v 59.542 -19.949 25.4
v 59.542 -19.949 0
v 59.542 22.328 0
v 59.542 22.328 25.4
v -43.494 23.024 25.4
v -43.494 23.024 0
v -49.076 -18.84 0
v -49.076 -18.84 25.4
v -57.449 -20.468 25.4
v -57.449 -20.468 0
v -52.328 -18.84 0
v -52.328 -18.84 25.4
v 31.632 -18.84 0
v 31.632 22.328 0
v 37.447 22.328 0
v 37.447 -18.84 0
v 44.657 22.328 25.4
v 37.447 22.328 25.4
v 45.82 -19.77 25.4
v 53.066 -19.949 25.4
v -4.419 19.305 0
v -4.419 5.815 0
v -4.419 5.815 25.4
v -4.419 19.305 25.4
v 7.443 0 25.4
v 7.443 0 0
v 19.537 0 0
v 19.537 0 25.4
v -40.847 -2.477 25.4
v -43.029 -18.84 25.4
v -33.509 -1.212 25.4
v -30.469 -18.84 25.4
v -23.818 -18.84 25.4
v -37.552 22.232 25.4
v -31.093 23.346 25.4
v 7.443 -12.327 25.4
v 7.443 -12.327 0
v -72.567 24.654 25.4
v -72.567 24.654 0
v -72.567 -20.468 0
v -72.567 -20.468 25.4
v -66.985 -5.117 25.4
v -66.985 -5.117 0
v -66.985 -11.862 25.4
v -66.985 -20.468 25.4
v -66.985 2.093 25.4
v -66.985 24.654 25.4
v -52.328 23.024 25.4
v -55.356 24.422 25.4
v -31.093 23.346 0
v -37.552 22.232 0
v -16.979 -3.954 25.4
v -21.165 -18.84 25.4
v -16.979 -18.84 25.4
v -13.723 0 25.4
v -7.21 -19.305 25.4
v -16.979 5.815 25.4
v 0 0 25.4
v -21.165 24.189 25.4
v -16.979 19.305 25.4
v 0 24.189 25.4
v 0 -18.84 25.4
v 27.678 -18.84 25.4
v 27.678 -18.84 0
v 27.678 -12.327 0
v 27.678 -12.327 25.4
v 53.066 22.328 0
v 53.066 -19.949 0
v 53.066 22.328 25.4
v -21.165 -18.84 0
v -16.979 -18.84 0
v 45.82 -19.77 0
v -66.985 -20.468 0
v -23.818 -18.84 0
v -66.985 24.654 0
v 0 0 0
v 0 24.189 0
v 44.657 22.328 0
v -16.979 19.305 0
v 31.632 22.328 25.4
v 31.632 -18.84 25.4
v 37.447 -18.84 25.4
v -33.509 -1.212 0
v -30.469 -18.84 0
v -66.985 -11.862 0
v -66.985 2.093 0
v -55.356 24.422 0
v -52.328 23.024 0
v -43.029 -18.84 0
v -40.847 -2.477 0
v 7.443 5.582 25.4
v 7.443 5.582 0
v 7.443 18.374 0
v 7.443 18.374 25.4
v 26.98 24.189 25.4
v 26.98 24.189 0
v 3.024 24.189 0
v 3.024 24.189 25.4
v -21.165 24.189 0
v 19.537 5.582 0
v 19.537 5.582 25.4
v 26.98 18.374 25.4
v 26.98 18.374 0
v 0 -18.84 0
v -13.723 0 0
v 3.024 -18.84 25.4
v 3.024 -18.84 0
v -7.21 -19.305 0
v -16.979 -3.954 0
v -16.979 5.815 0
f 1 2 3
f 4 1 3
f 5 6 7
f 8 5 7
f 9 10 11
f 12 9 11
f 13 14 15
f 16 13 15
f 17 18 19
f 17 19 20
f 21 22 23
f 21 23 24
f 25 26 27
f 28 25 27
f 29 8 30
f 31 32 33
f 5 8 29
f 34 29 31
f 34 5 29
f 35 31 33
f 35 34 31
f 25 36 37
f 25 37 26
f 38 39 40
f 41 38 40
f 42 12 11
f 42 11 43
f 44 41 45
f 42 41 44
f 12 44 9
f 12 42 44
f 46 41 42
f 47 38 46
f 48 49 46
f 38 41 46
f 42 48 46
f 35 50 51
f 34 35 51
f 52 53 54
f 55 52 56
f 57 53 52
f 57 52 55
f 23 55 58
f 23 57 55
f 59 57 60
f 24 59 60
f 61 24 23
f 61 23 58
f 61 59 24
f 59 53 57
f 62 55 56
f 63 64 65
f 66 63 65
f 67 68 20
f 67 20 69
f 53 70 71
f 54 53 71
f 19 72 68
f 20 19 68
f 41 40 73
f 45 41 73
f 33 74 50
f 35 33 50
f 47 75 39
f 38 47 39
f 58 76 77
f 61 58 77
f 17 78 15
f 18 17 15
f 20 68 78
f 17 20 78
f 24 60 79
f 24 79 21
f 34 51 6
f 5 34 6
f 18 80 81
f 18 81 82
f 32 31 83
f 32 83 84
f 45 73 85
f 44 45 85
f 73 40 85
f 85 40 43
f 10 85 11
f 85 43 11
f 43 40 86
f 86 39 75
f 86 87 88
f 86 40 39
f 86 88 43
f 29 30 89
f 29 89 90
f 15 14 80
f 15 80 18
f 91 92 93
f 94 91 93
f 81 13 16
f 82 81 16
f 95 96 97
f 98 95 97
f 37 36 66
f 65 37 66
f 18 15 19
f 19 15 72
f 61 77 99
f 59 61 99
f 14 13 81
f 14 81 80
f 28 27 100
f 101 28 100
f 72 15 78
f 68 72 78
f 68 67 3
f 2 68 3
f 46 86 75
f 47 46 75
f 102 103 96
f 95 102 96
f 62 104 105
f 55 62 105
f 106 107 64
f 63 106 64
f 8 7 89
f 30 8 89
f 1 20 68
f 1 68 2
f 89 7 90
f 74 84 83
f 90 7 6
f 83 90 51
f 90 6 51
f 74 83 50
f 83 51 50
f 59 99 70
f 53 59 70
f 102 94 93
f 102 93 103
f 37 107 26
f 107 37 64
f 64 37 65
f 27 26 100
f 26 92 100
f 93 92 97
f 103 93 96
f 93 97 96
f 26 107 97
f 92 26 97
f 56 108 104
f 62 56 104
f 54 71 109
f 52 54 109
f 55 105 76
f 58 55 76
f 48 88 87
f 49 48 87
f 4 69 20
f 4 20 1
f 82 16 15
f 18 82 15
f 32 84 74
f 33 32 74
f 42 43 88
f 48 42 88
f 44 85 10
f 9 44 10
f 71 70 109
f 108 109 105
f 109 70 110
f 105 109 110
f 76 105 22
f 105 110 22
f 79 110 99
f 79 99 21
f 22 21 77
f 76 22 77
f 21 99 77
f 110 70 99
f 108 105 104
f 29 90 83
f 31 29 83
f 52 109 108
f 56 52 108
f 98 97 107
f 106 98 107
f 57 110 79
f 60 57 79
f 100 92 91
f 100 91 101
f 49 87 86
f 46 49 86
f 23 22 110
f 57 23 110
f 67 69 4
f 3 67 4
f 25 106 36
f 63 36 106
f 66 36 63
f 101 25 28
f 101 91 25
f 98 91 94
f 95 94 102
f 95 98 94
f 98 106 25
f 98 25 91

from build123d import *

# Parameters (mm, degrees)
F1_DEPTH = 25.4
F0_W     = 4.4191577472
F0_H     = 13.4900575504
F0_W_2   = 19.5373245515
F0_H_2   = 5.814678967
F0_W_3   = 20.2350844629
F0_H_3   = 6.5124416724
F0_W_4   = 12.0945353992
F0_H_4   = 5.5820932612
F0_W_5   = 6.4767877425
F0_H_5   = 42.2775222197
F0_W_6   = 5.8146826923
F0_H_6   = 41.1679372191


with BuildPart() as f1:
    # F0 (on Top) → F1 (new body)
    with BuildSketch(Plane.XY):
        Polygon((-66.9851154089, 24.6542450041), (-72.5672096014, 24.6542450041), (-72.5672096014, -20.4676743597), (-66.9851154089, -20.4676743597), (-66.9851154089, -11.8619473651), (-66.9851154089, -5.1169185899), (-66.9851154089, 2.0932853222), align=None)
        Polygon((-55.3557574749, 24.4216565043), (-66.9851154089, 2.0932853222), (-66.9851154089, -5.1169185899), (-52.3283121177, 23.0241487059), align=None)
        Polygon((-52.3283121177, -18.8395641744), (-66.9851154089, -5.1169185899), (-66.9851154089, -11.8619473651), (-57.4490427971, -20.4676743597), align=None)
    extrude(amount=F1_DEPTH)


with BuildPart() as f1b:
    # F0 (on Top) → F1, piece 2 (new body)
    with BuildSketch(Plane.XY):
        Polygon((-43.4938073158, 23.0241487059), (-49.0759015083, -18.8395641744), (-43.0288986208, -18.8395641744), (-40.847143666, -2.4771811952), (-40.290668719, 1.6961821705), (-37.5524388172, 22.2319285154), align=None)
        Polygon((-34.1920848854, 2.7479922289), (-37.5524388172, 22.2319285154), (-40.290668719, 1.6961821705), align=None)
        Polygon((-31.0933983727, 23.3459057752), (-37.5524388172, 22.2319285154), (-34.1920848854, 2.7479922289), (-33.5091791969, -1.2116177386), (-30.4689239711, -18.8395641744), (-23.8177581876, -18.8395641744), align=None)
        Polygon((-40.290668719, 1.6961821705), (-40.847143666, -2.4771811952), (-33.5091791969, -1.2116177386), (-34.1920848854, 2.7479922289), align=None)
    extrude(amount=F1_DEPTH)


with BuildPart() as f1c:
    # F0 (on Top) → F1, piece 3 (new body)
    with BuildSketch(Plane.XY):
        Polygon((-21.1654342711, 24.1890698671), (-21.1654342711, -18.8395641744), (-16.9788654894, -18.8395641744), (-16.9788654894, -3.9539826103), (-16.9788654894, 0), (-16.9788654894, 5.8146798983), (-16.9788654894, 19.3047374487), (-16.9788654894, 24.1890698671), align=None)
        Polygon((-16.9788654894, 0), (-16.9788654894, -3.9539826103), (-7.2102043778, -19.3047374487), (0, -18.8395641744), (-13.7226460502, 0), align=None)
        Polygon((0, 24.1890698671), (-16.9788654894, 24.1890698671), (-16.9788654894, 19.3047374487), (-4.4191577472, 19.3047374487), (0, 19.3047374487), align=None)
        Polygon((-16.9788654894, 5.8146798983), (-16.9788654894, 0), (-13.7226460502, 0), (0, 0), (0, 5.8146798983), (-4.4191577472, 5.8146798983), align=None)
        with Locations((-2.2095788736, 12.5597086735)):
            Rectangle(F0_W, F0_H)
    extrude(amount=F1_DEPTH)


with BuildPart() as f1d:
    # F0 (on Top) → F1, piece 4 (new body)
    with BuildSketch(Plane.XY):
        Polygon((7.4427924119, 24.1890698671), (3.0236341991, 24.1890698671), (3.0236341991, -18.8395641744), (7.4427924119, -18.8395641744), (7.4427924119, -12.327122502), (7.4427924119, 0), (7.4427924119, 5.5820932612), (7.4427924119, 18.3743909001), align=None)
        with Locations((17.2114546876, 21.2817303836)):
            Rectangle(F0_W_2, F0_H_2)
        with Locations((17.5603346433, -15.5833433382)):
            Rectangle(F0_W_3, F0_H_3)
        with Locations((13.4900601115, 2.7910466306)):
            Rectangle(F0_W_4, F0_H_4)
    extrude(amount=F1_DEPTH)


with BuildPart() as f1e:
    # F0 (on Top) → F1, piece 5 (new body)
    with BuildSketch(Plane.XY):
        with Locations((56.3039305227, 1.1896119349)):
            Rectangle(F0_W_5, F0_H_5)
    extrude(amount=F1_DEPTH)


with BuildPart() as f1f:
    # F0 (on Top) → F1, piece 6 (new body)
    with BuildSketch(Plane.XY):
        Polygon((44.6567460895, 22.3283730447), (37.4465435743, 22.3283730447), (45.8196848631, -19.7699125856), (53.0655366514, -19.949149175), align=None)
    extrude(amount=F1_DEPTH)


with BuildPart() as f1g:
    # F0 (on Top) → F1, piece 7 (new body)
    with BuildSketch(Plane.XY):
        with Locations((34.5392022282, 1.7444044352)):
            Rectangle(F0_W_6, F0_H_6)
    extrude(amount=F1_DEPTH)


solid = Compound([f1.part, f1b.part, f1c.part, f1d.part, f1e.part, f1f.part, f1g.part])
